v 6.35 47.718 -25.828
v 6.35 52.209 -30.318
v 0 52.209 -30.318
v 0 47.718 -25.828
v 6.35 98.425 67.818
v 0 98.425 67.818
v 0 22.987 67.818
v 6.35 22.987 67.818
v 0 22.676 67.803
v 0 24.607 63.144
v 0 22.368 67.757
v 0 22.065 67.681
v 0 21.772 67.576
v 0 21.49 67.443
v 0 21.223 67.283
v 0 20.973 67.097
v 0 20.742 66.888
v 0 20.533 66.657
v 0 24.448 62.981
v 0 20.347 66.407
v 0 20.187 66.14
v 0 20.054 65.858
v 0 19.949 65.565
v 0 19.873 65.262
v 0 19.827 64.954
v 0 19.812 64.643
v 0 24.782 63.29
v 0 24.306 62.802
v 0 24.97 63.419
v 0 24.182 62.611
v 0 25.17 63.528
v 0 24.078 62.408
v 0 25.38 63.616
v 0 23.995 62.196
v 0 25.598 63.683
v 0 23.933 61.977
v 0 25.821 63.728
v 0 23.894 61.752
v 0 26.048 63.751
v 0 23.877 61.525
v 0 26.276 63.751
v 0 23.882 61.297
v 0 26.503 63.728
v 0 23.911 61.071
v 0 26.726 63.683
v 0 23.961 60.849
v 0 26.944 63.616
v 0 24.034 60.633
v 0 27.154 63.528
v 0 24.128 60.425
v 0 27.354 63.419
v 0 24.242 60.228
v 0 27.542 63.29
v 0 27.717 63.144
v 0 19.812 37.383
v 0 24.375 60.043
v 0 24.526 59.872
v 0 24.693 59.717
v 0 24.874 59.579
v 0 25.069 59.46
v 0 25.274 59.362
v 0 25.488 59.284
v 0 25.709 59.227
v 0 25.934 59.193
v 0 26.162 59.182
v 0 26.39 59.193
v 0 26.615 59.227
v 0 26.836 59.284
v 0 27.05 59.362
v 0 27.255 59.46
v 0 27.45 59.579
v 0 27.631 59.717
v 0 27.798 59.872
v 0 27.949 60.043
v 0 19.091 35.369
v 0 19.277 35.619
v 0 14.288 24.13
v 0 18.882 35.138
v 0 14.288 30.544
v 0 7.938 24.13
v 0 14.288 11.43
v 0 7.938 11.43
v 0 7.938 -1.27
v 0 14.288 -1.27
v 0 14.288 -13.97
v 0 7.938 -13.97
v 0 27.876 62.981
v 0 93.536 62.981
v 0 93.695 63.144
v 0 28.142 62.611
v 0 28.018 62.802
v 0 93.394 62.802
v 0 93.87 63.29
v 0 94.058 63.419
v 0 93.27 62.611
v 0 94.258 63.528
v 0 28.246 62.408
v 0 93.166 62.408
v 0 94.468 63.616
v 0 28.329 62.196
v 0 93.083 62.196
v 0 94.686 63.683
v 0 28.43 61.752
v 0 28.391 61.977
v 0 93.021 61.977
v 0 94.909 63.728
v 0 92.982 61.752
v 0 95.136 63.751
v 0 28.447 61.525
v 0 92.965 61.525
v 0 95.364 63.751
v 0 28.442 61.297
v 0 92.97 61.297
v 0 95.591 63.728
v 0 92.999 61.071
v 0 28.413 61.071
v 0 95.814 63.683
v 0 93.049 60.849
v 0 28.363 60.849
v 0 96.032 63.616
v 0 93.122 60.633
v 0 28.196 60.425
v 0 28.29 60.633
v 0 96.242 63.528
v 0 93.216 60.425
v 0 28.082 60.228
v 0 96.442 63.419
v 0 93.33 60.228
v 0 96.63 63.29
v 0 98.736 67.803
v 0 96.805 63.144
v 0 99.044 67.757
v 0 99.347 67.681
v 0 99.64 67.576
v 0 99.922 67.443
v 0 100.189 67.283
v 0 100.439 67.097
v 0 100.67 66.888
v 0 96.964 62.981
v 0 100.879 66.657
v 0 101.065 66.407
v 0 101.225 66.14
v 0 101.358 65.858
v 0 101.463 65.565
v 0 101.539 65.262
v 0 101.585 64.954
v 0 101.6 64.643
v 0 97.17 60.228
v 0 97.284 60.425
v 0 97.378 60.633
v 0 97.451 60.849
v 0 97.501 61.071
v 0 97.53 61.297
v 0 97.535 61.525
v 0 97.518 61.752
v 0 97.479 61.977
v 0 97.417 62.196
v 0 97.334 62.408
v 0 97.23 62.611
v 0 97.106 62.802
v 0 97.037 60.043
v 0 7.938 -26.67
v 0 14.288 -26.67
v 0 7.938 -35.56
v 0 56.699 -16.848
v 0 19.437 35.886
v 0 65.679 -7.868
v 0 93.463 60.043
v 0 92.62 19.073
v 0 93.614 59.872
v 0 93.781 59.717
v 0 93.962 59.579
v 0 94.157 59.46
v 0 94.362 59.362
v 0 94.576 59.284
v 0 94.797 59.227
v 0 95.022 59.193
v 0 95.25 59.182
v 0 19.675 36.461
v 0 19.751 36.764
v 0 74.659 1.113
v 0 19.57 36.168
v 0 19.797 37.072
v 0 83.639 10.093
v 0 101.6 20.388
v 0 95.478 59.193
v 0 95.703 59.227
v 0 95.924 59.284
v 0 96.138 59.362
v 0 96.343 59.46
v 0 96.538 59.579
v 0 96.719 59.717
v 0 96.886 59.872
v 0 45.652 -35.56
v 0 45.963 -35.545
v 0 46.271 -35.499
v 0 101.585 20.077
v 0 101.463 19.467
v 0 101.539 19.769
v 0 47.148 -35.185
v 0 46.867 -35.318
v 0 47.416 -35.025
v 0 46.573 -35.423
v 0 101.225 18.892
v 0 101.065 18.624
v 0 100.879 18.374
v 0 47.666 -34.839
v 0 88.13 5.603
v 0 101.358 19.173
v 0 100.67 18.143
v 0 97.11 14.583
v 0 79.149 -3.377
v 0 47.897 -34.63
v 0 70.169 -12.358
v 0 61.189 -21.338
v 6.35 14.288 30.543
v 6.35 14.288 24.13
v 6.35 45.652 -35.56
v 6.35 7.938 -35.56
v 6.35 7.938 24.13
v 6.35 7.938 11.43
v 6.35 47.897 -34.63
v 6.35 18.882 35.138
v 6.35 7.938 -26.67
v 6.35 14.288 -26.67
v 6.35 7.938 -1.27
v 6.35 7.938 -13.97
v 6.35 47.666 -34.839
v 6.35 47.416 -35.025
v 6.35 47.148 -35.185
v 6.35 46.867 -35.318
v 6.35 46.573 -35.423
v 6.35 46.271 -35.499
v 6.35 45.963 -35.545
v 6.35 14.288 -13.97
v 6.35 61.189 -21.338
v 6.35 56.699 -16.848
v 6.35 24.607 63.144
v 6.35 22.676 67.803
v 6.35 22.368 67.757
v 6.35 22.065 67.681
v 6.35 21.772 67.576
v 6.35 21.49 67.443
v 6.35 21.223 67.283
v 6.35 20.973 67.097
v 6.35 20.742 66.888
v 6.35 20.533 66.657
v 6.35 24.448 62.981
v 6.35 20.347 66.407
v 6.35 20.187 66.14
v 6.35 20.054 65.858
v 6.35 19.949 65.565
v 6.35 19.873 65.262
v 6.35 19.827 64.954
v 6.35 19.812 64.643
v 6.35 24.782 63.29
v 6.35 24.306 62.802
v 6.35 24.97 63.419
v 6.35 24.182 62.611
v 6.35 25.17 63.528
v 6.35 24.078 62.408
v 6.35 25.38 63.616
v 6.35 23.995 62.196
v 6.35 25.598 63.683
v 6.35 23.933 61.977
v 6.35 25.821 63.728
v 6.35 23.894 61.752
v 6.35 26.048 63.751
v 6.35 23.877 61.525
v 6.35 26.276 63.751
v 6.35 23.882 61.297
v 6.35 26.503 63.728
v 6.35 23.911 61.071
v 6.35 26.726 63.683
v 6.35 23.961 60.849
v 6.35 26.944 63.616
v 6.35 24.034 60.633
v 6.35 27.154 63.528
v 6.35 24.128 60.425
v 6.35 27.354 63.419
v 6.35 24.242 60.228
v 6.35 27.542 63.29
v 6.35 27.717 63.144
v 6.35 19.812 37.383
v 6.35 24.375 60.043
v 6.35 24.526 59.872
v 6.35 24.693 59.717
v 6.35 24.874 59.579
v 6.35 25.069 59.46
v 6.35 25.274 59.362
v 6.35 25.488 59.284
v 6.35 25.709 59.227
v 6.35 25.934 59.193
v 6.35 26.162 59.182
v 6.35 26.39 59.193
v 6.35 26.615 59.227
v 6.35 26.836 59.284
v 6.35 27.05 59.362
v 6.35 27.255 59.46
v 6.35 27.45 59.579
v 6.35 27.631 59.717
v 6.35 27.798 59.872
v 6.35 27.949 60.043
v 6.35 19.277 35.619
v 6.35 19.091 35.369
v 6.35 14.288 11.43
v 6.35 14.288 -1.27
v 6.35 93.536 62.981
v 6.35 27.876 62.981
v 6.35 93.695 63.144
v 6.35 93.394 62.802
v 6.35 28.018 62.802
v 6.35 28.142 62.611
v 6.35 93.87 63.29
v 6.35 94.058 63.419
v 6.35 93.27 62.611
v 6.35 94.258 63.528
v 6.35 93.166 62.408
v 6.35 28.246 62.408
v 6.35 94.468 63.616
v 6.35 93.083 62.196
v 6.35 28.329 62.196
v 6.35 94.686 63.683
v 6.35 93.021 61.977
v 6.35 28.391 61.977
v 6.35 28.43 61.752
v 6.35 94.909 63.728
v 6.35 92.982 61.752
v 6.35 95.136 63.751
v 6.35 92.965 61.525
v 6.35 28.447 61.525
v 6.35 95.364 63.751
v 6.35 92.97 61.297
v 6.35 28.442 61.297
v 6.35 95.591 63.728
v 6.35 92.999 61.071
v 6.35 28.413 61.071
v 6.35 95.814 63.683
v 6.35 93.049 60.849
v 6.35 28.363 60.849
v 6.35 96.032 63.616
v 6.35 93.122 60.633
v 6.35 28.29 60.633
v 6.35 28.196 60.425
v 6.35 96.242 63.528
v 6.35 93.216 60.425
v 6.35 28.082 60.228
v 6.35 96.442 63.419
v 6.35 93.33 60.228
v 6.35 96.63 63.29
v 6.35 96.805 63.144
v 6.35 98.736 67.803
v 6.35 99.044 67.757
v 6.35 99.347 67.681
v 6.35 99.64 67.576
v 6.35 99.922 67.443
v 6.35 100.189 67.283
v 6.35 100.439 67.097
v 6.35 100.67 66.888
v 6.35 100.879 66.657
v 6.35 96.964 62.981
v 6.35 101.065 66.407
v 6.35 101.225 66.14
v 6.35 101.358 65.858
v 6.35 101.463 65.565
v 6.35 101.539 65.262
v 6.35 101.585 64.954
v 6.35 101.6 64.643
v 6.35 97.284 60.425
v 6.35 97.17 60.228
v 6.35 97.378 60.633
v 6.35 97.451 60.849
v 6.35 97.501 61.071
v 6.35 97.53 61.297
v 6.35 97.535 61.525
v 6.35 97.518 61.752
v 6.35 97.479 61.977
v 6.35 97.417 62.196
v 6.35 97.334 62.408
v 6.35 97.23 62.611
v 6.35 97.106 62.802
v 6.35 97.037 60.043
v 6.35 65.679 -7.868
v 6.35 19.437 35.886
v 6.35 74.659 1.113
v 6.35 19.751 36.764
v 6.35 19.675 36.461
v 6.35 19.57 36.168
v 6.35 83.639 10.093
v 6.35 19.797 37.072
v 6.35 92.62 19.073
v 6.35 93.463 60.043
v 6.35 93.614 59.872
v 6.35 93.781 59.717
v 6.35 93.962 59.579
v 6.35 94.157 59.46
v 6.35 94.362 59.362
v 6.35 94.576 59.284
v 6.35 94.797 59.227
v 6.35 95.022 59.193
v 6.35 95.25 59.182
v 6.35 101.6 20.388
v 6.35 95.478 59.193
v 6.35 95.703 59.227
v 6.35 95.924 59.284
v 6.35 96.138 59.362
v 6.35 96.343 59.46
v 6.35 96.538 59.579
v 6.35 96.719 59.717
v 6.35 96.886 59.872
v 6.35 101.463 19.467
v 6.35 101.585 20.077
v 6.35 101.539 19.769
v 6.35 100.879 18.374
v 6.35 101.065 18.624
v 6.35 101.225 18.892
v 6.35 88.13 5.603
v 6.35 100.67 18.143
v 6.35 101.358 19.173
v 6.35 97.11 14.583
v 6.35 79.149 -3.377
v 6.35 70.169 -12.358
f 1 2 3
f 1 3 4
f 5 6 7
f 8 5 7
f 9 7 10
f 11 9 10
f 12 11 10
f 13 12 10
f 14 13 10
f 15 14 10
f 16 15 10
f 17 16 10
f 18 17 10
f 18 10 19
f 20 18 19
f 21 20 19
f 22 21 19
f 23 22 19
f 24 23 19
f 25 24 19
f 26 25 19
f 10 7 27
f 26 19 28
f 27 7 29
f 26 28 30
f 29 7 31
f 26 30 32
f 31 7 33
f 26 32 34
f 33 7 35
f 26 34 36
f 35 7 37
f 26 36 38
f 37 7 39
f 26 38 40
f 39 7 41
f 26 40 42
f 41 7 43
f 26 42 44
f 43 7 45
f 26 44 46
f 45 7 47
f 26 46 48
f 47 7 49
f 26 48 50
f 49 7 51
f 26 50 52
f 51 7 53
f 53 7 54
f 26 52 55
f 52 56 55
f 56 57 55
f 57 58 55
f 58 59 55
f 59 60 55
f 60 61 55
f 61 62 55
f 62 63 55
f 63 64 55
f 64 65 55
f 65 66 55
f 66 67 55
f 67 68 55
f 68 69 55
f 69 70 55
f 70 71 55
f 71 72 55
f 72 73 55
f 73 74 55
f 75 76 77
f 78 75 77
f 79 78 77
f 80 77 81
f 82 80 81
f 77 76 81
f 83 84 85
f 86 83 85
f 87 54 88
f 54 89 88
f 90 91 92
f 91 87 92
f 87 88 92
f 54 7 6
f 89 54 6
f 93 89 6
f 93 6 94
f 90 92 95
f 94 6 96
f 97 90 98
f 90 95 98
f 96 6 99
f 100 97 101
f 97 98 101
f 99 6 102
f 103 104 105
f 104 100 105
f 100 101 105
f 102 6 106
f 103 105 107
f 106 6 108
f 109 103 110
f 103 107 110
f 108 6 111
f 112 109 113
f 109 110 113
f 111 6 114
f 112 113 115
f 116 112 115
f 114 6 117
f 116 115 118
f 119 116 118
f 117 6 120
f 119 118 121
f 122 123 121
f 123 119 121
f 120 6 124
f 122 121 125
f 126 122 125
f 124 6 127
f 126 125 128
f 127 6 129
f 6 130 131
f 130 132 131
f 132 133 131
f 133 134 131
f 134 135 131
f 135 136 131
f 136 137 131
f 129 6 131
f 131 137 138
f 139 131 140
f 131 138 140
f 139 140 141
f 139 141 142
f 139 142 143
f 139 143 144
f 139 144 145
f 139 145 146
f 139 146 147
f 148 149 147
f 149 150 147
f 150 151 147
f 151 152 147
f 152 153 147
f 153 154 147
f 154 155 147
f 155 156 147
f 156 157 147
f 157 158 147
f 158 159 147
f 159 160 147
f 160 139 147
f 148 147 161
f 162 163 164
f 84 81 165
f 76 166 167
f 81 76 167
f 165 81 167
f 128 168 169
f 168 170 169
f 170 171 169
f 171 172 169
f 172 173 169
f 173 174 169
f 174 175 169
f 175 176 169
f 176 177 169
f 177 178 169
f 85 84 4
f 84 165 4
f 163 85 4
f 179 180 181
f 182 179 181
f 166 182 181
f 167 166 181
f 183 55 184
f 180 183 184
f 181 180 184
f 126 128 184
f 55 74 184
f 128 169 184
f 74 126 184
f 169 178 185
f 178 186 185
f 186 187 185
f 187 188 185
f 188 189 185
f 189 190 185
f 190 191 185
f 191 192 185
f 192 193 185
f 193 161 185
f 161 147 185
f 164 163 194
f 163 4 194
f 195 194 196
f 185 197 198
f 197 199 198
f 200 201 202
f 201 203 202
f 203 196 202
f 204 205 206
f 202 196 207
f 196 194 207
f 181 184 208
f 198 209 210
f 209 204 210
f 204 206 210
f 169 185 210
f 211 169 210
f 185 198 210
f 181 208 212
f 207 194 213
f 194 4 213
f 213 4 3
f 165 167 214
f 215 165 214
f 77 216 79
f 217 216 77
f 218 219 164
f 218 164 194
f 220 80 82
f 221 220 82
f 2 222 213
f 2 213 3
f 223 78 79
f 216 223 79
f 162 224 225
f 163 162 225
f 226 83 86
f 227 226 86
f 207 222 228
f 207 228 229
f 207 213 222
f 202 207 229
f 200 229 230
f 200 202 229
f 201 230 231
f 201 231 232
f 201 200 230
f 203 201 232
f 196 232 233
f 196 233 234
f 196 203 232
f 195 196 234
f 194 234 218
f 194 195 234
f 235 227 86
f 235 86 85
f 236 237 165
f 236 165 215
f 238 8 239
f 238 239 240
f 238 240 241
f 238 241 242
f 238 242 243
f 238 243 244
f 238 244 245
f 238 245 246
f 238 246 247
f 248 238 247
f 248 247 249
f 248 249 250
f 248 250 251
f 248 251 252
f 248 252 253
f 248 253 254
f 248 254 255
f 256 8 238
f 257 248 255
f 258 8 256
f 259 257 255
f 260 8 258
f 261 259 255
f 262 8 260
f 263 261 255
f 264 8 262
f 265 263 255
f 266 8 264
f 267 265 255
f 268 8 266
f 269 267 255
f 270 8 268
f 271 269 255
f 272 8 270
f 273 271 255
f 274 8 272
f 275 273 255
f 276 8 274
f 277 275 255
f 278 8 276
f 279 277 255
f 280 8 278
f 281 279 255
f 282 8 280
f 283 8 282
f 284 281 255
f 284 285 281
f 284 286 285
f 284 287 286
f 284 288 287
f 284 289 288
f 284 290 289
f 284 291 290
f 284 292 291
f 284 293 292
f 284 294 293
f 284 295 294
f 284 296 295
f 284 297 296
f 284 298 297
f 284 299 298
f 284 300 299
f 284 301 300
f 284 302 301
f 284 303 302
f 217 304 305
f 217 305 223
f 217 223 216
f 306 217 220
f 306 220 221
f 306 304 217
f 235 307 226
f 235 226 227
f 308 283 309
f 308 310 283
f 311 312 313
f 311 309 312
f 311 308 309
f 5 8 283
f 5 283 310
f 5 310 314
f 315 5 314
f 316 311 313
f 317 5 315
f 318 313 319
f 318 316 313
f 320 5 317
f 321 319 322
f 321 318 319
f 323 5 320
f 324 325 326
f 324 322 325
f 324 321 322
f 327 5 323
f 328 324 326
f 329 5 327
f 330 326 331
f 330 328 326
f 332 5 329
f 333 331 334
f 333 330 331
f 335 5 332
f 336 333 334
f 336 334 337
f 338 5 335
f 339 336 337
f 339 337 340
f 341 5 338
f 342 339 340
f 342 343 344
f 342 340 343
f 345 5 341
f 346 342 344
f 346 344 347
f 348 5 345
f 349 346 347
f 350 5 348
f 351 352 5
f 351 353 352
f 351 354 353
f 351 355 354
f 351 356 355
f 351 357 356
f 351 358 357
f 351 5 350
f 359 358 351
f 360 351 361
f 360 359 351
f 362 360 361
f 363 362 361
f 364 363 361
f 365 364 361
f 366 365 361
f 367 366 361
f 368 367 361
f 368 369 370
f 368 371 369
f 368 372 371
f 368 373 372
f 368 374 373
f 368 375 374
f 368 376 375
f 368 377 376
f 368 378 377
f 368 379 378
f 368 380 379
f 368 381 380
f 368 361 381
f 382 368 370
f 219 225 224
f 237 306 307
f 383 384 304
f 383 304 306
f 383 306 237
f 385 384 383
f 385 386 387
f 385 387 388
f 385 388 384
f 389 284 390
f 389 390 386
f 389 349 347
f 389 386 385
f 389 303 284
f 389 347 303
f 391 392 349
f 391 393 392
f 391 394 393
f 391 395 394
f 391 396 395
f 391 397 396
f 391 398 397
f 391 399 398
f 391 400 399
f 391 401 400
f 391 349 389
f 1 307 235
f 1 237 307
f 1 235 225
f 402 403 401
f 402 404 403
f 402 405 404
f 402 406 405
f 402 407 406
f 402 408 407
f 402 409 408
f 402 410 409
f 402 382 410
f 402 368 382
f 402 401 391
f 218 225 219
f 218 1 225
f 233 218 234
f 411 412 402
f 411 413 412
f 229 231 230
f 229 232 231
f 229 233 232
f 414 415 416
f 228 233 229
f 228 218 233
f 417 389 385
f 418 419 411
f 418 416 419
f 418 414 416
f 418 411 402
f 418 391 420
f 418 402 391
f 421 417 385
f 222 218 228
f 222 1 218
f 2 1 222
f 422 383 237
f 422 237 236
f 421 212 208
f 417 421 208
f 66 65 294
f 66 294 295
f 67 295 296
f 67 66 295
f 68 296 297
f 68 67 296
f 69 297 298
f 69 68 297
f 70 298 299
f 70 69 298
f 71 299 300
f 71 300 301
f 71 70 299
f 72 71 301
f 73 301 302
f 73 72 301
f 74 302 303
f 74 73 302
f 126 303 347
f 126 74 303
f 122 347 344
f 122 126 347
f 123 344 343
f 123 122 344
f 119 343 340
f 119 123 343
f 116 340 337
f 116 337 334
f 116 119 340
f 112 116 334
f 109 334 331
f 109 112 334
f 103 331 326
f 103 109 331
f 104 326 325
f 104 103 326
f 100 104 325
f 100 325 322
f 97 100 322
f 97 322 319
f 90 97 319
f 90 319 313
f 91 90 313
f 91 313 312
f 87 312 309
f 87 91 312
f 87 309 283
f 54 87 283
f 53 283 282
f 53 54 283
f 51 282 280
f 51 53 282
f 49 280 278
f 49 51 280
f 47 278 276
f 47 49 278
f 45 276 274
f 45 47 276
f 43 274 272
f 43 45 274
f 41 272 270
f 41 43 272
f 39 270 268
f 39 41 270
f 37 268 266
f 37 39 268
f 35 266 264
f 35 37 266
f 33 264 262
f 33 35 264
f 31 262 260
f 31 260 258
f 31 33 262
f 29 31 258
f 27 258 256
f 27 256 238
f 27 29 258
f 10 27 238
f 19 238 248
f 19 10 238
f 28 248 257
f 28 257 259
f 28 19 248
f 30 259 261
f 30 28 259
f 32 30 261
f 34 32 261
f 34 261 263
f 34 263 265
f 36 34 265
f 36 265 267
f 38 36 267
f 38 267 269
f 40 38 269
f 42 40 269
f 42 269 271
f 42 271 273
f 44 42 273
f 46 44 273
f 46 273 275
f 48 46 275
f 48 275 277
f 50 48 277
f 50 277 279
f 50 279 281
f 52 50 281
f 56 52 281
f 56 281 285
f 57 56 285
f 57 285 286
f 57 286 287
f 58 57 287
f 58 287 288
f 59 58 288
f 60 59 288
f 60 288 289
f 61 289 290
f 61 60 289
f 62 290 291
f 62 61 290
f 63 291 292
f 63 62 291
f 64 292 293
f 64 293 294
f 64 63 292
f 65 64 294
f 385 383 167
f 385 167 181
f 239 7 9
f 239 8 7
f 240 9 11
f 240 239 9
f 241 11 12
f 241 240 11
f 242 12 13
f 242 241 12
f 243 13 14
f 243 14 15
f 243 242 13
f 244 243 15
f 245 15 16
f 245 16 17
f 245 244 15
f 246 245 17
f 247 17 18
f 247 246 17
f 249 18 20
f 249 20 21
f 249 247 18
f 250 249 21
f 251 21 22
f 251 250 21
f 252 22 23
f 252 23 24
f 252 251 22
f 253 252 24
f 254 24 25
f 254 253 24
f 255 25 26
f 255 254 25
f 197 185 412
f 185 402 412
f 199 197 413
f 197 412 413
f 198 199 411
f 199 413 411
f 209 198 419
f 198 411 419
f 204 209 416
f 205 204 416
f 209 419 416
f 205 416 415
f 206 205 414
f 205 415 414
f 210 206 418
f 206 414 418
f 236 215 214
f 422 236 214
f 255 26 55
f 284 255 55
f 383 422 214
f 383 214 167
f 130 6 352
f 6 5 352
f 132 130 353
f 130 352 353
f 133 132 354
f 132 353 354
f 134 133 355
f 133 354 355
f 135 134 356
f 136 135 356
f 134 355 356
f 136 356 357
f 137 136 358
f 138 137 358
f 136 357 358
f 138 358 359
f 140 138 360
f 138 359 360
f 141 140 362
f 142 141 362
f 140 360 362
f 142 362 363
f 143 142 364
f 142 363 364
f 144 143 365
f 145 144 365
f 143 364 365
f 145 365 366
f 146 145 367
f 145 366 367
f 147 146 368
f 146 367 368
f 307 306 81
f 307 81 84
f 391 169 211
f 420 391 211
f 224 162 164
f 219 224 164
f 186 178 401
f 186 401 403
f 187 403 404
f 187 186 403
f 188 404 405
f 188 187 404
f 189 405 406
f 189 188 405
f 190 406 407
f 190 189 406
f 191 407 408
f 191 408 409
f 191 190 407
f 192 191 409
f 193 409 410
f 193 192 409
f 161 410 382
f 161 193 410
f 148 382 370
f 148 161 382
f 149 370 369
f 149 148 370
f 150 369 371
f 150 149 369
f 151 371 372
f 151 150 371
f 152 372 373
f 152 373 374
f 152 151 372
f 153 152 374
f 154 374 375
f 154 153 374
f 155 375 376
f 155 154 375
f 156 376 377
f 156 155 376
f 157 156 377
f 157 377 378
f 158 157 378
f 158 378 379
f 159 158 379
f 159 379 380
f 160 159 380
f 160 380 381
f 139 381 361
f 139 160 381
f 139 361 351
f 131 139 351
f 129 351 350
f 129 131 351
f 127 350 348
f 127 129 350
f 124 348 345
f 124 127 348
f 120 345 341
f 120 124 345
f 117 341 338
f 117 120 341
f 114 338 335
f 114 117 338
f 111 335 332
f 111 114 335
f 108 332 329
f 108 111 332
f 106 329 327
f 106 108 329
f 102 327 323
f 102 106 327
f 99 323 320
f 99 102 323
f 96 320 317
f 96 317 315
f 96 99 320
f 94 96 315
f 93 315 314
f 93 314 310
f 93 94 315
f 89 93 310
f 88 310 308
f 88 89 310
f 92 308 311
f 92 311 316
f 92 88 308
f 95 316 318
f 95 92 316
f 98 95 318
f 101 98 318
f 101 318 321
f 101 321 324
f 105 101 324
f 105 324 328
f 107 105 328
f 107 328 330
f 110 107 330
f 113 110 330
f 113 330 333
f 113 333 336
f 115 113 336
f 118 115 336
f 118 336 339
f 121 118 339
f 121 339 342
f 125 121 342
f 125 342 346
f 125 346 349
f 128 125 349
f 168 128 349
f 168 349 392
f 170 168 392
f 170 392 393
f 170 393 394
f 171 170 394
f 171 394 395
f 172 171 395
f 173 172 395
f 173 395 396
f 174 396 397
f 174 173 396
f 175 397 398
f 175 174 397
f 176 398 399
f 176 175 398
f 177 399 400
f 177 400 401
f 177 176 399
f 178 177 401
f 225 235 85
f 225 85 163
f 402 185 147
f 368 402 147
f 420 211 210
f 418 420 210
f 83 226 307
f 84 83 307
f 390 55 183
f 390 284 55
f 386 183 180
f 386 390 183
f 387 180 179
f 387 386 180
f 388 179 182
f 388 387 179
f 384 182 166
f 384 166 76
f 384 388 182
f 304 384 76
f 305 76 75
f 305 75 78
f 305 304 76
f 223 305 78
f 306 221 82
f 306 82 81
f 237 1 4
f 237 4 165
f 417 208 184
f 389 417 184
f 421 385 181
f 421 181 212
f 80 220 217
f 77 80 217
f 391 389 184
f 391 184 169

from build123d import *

# Parameters (mm, degrees)
SKETCH2_R           = 2.286
MAIN_DEPTH          = 6.35
SKETCH5_W           = 12.7
SKETCH5_H           = 6.35
SKETCH5_H_2         = 35.219317332
ACRYLIC_JOINT_DEPTH = 123.31992325
SKETCH6_W           = 3.81
SKETCH6_H           = 39.029317332
CUT_EXTRUDE1_DEPTH  = 123.31992325
FILLET4_R           = 3.175


with BuildPart() as part:
    # Sketch2 → Main (new body)
    with BuildSketch(Plane(origin=(0, 0, 0), x_dir=(0, 0, -1), z_dir=(1, 0, 0))):
        Polygon((-67.818, 101.6), (-67.818, 19.812), (-36.068, 19.812), (-29.718, 13.462), (-29.718, 7.9375), (-24.1935, 7.9375), (45.72, 7.9375), (52.07, 7.9375), (52.07, 30.456817332), (-19.073182668, 101.6), (-55.118, 101.6), align=None)
        with Locations((-61.468, 26.162)):
            Circle(SKETCH2_R, mode=Mode.SUBTRACT)
        with Locations((-61.468, 95.25)):
            Circle(SKETCH2_R, mode=Mode.SUBTRACT)
    extrude(amount=MAIN_DEPTH)

    # Sketch5 → Acrylic Joint (cut, through all)
    with BuildSketch(Plane(origin=(6.35, 0, 0), x_dir=(0, 0, -1), z_dir=(1, 0, 0))):
        with Locations((-30.48, 11.1125)):
            Rectangle(SKETCH5_W, SKETCH5_H)
        with Locations((-5.08, 11.1125)):
            Rectangle(SKETCH5_W, SKETCH5_H)
        with Locations((20.32, 11.1125)):
            Rectangle(SKETCH5_W, SKETCH5_H)
        Polygon((16.847841816, 56.698719395), (21.337969877, 61.188847455), (30.318225998, 52.208591334), (25.828097937, 47.718463274), align=None)
        Polygon((-1.112670426, 74.659231637), (3.377457634, 79.149359697), (12.357713756, 70.169103576), (7.867585695, 65.678975516), align=None)
        Polygon((-19.073182668, 92.619743879), (-14.583054608, 97.109871939), (-5.602798487, 88.129615818), (-10.092926547, 83.639487758), align=None)
        with Locations((45.72, 25.547158666)):
            Rectangle(SKETCH5_W, SKETCH5_H_2)
    extrude(amount=-ACRYLIC_JOINT_DEPTH, mode=Mode.SUBTRACT)

    # Sketch6 → Cut-Extrude1 (cut, through all)
    with BuildSketch(Plane(origin=(6.35, 0, 0), x_dir=(0, 0, -1), z_dir=(1, 0, 0))):
        with Locations((37.465, 27.452158666)):
            Rectangle(SKETCH6_W, SKETCH6_H)
    extrude(amount=-CUT_EXTRUDE1_DEPTH, mode=Mode.SUBTRACT)

    # Fillet4
    fillet4_edges = [part.edges().sort_by_distance(p)[0] for p in [
        (3.175, 46.966817332, -35.56),
        (3.175, 19.812, 36.068),
        (3.175, 19.812, 67.818),
        (3.175, 101.6, 67.818),
        (3.175, 101.6, 19.073182668),
    ]]
    fillet(fillet4_edges, radius=FILLET4_R)


solid = part.part
